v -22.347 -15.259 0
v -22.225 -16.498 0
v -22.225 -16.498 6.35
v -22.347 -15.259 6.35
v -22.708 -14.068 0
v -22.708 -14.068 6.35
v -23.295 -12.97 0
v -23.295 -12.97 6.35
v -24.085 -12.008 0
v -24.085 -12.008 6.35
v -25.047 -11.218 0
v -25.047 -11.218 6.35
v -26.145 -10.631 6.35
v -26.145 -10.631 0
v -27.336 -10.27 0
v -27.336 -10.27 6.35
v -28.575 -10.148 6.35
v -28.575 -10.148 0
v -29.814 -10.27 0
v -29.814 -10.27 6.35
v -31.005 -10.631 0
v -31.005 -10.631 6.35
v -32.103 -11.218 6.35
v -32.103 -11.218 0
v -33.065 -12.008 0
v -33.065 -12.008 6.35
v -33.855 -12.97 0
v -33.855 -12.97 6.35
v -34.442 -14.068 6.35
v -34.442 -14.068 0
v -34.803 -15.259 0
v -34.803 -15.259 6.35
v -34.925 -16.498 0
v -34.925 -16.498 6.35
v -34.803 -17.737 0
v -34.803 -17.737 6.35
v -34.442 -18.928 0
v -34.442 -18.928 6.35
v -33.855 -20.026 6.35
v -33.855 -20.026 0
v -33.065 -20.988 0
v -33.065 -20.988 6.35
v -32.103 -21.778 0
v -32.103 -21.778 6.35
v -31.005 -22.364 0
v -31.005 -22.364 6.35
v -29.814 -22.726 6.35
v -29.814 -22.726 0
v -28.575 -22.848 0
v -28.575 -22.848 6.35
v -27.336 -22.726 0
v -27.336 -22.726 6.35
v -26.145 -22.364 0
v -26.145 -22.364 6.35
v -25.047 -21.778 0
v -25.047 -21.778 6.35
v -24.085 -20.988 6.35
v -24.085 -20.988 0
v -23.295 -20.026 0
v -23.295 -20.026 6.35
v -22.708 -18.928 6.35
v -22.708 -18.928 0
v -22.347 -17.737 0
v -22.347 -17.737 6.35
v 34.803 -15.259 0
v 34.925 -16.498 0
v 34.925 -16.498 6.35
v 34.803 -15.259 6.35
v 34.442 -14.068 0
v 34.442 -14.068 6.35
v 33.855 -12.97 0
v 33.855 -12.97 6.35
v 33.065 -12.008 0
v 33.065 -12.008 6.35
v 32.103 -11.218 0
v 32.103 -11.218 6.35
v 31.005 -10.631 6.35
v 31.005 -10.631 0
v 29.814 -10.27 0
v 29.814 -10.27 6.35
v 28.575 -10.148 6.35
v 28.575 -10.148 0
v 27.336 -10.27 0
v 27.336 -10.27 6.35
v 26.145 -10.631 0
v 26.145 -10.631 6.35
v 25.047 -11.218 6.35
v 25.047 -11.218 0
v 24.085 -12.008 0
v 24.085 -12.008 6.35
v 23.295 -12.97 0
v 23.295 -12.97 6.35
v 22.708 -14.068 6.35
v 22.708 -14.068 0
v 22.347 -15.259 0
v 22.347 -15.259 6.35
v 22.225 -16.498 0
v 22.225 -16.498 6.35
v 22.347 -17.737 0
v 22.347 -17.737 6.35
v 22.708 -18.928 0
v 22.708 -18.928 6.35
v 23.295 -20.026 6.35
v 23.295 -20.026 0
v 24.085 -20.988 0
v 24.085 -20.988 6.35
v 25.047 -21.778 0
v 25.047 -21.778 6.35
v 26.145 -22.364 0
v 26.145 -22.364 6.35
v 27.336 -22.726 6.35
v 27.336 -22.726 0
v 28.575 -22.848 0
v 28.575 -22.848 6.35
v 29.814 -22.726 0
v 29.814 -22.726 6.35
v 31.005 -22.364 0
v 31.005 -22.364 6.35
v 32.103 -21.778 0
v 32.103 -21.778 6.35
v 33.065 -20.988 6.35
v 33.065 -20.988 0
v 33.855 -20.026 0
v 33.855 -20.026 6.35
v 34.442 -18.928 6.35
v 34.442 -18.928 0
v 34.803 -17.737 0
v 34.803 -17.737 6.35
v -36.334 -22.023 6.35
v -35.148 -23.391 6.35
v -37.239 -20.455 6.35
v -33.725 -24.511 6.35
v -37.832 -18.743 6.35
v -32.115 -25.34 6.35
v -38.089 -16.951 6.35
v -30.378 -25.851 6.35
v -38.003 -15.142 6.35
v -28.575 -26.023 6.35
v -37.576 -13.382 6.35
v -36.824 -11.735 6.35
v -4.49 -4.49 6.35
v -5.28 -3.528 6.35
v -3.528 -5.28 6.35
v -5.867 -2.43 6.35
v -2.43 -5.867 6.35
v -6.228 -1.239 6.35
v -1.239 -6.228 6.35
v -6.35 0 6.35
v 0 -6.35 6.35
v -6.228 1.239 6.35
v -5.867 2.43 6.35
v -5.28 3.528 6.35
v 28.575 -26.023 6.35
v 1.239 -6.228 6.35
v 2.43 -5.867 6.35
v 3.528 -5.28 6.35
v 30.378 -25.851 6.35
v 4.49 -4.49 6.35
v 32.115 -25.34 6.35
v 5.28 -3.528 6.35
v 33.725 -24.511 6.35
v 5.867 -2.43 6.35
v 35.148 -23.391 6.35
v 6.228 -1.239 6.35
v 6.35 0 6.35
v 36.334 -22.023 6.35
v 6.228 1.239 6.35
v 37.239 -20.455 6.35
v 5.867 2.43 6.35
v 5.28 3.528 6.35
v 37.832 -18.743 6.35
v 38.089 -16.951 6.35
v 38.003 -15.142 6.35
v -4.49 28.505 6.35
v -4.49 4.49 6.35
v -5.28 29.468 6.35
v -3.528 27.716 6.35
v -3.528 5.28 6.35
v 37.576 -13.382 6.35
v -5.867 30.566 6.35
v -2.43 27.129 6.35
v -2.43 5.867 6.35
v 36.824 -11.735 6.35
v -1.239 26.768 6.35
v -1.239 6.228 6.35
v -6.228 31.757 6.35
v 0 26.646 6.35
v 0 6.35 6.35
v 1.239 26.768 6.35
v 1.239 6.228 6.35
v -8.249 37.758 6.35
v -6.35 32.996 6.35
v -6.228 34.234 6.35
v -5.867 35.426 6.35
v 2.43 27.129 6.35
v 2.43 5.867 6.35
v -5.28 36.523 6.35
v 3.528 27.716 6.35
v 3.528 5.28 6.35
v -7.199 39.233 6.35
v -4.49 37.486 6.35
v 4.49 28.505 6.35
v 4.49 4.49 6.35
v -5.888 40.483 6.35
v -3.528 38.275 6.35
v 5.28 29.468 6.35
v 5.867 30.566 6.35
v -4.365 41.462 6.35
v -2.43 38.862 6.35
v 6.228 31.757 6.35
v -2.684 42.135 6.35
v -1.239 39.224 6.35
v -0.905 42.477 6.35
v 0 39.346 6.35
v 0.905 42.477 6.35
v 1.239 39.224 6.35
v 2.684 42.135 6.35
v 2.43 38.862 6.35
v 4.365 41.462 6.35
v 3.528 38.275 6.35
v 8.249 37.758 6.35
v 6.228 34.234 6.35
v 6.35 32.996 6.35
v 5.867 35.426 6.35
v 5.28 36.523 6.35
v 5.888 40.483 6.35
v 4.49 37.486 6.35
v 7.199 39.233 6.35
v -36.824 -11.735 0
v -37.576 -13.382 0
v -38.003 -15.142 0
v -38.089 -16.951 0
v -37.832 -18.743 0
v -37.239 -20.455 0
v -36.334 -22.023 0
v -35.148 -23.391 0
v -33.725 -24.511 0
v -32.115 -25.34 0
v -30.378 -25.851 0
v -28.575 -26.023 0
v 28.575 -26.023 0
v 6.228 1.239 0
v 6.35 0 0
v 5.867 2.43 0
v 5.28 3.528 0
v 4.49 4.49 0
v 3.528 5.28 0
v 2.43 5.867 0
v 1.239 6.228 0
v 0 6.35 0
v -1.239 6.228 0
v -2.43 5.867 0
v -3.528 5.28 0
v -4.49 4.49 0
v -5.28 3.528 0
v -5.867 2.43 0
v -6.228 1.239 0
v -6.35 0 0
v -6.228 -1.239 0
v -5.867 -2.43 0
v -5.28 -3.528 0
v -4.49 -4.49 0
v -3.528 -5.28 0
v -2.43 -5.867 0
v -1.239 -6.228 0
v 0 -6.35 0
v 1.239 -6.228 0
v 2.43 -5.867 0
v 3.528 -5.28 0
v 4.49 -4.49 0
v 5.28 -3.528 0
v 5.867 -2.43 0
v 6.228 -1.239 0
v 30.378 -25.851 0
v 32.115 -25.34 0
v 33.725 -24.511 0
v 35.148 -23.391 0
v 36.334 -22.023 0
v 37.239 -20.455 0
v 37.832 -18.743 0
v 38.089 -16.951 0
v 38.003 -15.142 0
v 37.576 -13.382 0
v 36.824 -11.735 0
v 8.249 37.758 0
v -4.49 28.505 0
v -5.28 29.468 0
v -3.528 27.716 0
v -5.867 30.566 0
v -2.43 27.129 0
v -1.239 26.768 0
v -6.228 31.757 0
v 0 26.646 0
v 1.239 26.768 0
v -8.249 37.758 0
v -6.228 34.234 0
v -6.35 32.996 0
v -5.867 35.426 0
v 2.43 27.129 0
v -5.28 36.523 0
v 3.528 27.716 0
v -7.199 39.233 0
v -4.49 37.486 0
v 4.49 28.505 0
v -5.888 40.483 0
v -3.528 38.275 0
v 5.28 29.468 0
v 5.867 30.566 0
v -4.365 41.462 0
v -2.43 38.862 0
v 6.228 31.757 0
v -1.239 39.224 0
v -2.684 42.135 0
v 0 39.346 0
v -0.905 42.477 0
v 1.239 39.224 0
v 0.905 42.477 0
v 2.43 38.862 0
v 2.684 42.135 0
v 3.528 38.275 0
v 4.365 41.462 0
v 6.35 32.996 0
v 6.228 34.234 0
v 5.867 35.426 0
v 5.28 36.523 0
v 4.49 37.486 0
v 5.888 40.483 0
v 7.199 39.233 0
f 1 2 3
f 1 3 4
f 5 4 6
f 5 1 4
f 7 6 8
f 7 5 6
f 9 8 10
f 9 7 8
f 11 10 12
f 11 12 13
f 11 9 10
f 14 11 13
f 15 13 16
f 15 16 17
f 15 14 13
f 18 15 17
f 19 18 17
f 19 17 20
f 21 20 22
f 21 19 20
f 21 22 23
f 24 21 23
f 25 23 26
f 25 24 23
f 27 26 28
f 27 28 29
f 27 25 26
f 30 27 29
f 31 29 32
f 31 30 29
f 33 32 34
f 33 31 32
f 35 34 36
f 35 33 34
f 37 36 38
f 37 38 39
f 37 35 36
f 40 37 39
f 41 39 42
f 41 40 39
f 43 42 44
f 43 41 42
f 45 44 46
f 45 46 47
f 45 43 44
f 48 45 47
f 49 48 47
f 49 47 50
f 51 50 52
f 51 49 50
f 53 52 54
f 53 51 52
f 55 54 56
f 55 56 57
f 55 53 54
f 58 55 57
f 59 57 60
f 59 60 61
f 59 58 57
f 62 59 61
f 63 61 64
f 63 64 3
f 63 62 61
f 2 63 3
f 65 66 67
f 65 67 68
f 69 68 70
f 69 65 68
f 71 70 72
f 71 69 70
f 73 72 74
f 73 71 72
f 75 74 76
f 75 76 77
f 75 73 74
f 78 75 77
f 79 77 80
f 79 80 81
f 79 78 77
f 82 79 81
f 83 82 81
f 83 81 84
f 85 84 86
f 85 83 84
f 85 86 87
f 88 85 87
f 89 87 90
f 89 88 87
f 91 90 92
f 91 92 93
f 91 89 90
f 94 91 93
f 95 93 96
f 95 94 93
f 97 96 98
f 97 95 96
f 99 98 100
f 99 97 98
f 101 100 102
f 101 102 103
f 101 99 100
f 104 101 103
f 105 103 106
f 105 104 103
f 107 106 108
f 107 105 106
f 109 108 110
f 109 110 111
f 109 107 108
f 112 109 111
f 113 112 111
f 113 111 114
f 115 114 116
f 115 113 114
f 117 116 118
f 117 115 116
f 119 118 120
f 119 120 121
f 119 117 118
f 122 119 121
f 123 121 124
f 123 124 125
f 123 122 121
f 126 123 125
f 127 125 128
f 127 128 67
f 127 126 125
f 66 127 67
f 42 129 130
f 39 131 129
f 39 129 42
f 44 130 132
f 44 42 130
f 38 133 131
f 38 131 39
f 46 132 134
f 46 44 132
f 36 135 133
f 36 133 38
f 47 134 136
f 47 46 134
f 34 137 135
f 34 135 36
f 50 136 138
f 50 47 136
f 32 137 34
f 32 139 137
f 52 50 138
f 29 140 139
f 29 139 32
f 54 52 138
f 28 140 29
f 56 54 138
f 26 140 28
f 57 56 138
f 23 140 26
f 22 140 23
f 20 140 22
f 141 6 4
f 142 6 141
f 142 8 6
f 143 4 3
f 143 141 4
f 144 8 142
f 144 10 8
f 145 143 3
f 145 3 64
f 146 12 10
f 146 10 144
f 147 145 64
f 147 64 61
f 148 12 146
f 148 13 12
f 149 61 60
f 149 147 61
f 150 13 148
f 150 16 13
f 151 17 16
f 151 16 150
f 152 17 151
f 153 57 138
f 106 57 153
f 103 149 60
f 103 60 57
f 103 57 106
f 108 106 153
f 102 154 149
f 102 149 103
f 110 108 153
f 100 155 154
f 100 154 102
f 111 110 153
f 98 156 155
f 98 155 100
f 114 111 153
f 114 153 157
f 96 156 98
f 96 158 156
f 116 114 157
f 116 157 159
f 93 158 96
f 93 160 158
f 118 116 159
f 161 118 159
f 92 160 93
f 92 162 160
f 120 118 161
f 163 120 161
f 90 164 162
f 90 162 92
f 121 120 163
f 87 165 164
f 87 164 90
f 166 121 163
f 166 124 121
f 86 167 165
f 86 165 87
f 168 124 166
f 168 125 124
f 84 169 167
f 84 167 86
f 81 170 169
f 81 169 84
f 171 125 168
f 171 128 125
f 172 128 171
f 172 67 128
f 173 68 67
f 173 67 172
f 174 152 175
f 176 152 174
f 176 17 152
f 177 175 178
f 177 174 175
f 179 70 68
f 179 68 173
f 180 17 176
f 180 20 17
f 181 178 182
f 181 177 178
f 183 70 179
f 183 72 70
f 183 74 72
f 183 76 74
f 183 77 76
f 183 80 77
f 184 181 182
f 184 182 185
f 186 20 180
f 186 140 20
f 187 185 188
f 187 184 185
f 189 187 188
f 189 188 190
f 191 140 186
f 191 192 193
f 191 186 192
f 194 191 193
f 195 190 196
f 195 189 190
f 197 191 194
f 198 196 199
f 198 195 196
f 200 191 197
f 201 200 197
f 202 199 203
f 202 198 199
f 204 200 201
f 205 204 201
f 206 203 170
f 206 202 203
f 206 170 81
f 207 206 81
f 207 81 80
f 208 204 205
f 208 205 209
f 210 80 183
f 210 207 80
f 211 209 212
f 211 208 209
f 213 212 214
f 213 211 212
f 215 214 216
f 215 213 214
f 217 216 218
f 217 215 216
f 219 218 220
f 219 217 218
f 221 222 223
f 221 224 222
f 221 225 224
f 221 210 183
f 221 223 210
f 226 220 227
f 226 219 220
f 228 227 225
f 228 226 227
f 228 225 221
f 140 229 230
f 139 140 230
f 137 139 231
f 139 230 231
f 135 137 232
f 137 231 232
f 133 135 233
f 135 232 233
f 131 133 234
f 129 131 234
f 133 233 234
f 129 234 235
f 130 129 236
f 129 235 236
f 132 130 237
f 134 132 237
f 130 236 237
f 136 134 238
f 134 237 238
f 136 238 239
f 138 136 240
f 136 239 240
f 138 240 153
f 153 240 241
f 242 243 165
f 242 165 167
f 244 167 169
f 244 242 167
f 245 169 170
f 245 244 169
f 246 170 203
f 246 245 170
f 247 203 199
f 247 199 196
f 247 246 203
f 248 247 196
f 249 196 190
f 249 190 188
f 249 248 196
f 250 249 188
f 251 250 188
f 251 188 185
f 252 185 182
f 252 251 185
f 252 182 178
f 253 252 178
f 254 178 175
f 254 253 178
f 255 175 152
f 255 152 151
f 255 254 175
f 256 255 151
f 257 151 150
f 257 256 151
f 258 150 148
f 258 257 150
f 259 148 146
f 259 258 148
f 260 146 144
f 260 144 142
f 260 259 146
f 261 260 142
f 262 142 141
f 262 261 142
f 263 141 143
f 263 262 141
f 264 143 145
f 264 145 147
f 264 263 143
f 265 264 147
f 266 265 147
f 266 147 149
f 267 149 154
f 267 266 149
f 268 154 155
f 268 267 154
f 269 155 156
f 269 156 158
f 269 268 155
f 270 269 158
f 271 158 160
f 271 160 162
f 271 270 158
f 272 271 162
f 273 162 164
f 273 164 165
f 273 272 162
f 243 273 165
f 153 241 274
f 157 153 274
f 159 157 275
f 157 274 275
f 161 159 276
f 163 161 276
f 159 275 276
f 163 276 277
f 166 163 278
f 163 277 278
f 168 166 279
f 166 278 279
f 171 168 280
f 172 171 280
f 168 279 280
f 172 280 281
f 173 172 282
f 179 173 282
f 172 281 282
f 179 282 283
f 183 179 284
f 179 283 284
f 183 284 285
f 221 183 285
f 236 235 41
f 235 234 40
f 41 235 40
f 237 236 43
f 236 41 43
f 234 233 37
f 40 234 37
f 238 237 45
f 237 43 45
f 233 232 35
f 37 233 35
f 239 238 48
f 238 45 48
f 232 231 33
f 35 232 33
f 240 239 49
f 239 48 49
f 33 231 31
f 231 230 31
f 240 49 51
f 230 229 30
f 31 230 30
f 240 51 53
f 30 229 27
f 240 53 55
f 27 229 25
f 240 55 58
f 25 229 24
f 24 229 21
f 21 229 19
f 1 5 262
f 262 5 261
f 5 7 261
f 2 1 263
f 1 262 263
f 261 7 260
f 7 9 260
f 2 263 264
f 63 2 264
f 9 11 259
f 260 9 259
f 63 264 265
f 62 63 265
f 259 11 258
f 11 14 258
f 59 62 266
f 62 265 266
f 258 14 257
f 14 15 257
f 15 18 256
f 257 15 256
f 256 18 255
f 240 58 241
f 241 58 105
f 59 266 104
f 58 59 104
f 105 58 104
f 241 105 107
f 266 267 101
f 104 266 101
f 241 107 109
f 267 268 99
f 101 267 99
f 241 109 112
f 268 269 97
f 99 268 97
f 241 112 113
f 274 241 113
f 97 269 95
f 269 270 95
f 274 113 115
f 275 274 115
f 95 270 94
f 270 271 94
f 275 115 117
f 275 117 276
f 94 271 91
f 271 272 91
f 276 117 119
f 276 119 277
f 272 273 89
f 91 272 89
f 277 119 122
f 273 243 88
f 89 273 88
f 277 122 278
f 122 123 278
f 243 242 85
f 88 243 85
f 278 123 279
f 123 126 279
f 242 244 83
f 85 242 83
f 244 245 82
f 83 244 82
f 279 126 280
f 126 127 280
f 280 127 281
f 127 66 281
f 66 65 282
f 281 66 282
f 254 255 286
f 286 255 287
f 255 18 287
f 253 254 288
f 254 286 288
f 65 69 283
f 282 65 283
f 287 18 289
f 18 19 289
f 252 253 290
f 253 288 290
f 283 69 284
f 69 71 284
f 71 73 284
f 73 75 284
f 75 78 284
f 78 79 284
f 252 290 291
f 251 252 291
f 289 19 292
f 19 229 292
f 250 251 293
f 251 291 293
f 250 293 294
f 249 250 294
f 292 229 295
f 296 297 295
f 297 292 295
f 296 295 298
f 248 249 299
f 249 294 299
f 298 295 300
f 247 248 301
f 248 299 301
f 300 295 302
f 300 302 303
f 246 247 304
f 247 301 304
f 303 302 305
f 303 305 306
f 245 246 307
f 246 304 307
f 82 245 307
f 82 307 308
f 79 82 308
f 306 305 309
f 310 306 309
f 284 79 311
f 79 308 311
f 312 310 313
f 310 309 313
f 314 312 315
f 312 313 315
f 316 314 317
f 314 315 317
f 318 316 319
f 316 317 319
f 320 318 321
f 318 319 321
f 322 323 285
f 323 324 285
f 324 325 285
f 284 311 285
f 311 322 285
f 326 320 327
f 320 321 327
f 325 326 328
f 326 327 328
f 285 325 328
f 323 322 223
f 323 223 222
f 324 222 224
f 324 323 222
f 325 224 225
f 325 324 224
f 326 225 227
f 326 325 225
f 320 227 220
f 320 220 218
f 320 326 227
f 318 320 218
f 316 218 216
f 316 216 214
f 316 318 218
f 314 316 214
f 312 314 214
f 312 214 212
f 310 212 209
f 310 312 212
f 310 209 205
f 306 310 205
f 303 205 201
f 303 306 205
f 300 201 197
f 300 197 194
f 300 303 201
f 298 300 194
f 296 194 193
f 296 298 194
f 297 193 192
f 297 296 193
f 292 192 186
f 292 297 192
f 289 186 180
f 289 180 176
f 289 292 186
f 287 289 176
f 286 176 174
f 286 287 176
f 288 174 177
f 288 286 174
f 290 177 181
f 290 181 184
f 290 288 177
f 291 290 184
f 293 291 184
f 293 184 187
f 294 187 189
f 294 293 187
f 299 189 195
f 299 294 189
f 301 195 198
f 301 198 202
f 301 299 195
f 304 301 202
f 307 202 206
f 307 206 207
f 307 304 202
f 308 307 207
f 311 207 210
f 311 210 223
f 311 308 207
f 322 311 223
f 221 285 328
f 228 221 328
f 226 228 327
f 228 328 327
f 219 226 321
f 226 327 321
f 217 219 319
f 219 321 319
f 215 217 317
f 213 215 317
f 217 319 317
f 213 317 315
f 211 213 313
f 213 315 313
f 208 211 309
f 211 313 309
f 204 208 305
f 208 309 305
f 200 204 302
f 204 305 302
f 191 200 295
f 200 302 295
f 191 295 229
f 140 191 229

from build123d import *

# Parameters (mm, degrees)
SKETCH1_R           = 6.35
BOSS_EXTRUDE1_DEPTH = 6.35


with BuildPart() as part:
    # Sketch1 → Boss-Extrude1 (new body)
    with BuildSketch(Plane.XY):
        with BuildLine():
            Line((-8.248891971, 37.758067884), (-36.823891971, -11.735283942))
            ThreePointArc((-36.823891971, -11.735283942), (-36.823891971, -21.260283942), (-28.575, -26.022783942))
            Line((-28.575, -26.022783942), (28.575, -26.022783942))
            ThreePointArc((28.575, -26.022783942), (36.823891971, -21.260283942), (36.823891971, -11.735283942))
            Line((36.823891971, -11.735283942), (8.248891971, 37.758067884))
            ThreePointArc((8.248891971, 37.758067884), (0, 42.520567884), (-8.248891971, 37.758067884))
        make_face()
        Circle(SKETCH1_R, mode=Mode.SUBTRACT)
        with Locations((-28.575, -16.497783942)):
            Circle(SKETCH1_R, mode=Mode.SUBTRACT)
        with Locations((0, 32.995567884)):
            Circle(SKETCH1_R, mode=Mode.SUBTRACT)
        with Locations((28.575, -16.497783942)):
            Circle(SKETCH1_R, mode=Mode.SUBTRACT)
    extrude(amount=BOSS_EXTRUDE1_DEPTH)


solid = part.part
